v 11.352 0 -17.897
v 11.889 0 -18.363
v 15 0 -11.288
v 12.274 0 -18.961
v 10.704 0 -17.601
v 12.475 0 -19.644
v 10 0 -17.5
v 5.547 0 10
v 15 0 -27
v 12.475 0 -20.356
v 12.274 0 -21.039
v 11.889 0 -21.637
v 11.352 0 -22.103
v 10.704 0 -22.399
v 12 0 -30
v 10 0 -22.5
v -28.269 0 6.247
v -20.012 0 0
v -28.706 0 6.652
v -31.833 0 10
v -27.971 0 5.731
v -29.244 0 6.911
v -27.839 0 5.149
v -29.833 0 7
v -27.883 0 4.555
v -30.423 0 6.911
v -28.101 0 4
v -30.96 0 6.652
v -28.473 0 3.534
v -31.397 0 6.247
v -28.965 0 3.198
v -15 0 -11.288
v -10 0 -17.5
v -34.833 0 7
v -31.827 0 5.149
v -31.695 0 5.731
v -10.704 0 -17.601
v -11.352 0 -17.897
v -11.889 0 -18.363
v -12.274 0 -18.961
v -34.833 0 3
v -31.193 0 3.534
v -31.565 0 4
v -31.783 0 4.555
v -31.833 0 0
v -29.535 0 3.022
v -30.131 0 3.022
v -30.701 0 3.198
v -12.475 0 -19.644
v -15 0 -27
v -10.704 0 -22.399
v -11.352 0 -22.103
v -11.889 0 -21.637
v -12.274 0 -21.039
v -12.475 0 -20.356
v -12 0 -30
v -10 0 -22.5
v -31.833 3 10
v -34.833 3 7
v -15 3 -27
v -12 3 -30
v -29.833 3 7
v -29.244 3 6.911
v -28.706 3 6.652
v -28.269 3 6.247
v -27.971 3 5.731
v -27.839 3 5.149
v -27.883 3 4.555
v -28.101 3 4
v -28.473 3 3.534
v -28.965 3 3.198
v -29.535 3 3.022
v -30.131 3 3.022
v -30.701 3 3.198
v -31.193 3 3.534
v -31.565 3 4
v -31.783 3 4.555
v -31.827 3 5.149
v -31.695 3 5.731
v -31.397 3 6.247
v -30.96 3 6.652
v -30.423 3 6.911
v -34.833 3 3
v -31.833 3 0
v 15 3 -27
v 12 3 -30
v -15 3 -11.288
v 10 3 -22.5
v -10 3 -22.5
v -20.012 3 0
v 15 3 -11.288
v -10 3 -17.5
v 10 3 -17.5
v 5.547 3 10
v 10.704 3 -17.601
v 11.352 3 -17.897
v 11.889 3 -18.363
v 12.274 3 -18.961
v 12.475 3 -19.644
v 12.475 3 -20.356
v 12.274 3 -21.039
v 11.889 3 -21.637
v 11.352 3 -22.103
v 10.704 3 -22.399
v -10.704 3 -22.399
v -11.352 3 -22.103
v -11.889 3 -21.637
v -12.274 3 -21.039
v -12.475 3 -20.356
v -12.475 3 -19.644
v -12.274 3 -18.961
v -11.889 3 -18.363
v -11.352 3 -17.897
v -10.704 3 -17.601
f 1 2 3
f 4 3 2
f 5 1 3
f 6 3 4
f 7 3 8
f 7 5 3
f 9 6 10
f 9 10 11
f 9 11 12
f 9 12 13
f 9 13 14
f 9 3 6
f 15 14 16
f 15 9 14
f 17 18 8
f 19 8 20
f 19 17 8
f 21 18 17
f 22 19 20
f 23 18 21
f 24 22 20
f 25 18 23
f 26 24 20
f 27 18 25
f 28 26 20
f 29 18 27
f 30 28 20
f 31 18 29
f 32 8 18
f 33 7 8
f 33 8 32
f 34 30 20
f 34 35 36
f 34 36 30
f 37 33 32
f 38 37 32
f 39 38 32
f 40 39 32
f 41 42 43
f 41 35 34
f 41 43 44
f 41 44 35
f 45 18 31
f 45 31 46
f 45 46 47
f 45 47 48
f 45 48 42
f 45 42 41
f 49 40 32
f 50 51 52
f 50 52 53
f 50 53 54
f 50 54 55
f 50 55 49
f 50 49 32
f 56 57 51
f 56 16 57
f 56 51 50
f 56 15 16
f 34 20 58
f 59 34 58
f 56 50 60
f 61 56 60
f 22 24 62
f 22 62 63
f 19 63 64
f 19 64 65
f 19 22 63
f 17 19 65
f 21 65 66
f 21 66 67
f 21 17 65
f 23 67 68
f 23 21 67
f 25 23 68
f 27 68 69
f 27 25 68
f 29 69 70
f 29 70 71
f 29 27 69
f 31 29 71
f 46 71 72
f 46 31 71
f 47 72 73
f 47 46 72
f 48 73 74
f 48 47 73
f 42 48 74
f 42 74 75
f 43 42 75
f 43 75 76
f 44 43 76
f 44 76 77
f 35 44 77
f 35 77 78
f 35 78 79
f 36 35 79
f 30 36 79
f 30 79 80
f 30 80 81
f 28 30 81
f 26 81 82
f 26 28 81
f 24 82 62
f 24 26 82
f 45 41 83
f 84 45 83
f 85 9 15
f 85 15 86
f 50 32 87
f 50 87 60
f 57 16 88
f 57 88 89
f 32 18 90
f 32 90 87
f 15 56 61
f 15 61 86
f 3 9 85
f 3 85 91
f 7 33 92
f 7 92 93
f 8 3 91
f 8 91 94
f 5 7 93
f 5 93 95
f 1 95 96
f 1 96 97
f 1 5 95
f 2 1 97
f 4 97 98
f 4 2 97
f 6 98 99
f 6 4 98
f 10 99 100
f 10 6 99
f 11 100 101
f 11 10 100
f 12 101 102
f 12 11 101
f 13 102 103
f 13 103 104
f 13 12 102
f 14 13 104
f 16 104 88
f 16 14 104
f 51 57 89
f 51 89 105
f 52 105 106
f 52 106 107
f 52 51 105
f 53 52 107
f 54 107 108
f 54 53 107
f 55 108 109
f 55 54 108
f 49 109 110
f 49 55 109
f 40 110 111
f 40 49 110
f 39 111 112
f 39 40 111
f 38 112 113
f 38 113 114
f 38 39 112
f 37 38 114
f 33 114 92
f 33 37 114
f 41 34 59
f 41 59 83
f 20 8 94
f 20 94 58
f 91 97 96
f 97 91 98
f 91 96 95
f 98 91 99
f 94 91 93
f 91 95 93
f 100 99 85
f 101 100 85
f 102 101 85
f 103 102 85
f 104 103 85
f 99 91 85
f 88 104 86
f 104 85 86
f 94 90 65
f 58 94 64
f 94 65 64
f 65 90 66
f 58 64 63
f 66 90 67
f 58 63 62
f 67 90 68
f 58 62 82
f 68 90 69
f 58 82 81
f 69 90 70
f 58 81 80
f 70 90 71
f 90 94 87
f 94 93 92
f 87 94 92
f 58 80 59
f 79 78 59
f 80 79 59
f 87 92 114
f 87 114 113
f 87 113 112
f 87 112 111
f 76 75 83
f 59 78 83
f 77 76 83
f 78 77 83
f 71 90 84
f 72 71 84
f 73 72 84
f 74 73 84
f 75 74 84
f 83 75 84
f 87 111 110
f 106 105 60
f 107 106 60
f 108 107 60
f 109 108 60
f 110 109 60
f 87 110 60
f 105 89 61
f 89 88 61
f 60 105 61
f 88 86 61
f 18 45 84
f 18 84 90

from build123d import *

# Parameters (mm, degrees)
CROQUIS1_R              = 2
SALIENTE_EXTRUIR1_DEPTH = 3
CHAFL_N1_SIZE           = 3


with BuildPart() as part:
    # Croquis1 → Saliente-Extruir1 (new body)
    with BuildSketch(Plane(origin=(0, 0, 0), x_dir=(1, 0, 0), z_dir=(0, 1, 0))):
        Polygon((-15, 11.288045039), (-15, 30), (15, 30), (15, 11.288045039), (5.54714751, -10), (-34.833084075, -10), (-34.833084075, 0), (-20.012401302, 0), align=None)
        with Locations(Location((-29.833084075, -5, 0), (0, 0, 270))):
            Circle(CROQUIS1_R, mode=Mode.SUBTRACT)
        with BuildLine():
            Line((-10, 17.5), (10, 17.5))
            ThreePointArc((10, 17.5), (12.5, 20), (10, 22.5))
            Line((10, 22.5), (-10, 22.5))
            ThreePointArc((-10, 22.5), (-12.5, 20), (-10, 17.5))
        make_face(mode=Mode.SUBTRACT)
    extrude(amount=SALIENTE_EXTRUIR1_DEPTH)

    # Chaflán1
    chafl_n1_edges = [part.edges().sort_by_distance(p)[0] for p in [
        (-34.833084075, 1.5, 10),
        (-34.833084075, 1.5, 0),
        (-15, 1.5, -30),
        (15, 1.5, -30),
    ]]
    chamfer(chafl_n1_edges, length=CHAFL_N1_SIZE)


solid = part.part
